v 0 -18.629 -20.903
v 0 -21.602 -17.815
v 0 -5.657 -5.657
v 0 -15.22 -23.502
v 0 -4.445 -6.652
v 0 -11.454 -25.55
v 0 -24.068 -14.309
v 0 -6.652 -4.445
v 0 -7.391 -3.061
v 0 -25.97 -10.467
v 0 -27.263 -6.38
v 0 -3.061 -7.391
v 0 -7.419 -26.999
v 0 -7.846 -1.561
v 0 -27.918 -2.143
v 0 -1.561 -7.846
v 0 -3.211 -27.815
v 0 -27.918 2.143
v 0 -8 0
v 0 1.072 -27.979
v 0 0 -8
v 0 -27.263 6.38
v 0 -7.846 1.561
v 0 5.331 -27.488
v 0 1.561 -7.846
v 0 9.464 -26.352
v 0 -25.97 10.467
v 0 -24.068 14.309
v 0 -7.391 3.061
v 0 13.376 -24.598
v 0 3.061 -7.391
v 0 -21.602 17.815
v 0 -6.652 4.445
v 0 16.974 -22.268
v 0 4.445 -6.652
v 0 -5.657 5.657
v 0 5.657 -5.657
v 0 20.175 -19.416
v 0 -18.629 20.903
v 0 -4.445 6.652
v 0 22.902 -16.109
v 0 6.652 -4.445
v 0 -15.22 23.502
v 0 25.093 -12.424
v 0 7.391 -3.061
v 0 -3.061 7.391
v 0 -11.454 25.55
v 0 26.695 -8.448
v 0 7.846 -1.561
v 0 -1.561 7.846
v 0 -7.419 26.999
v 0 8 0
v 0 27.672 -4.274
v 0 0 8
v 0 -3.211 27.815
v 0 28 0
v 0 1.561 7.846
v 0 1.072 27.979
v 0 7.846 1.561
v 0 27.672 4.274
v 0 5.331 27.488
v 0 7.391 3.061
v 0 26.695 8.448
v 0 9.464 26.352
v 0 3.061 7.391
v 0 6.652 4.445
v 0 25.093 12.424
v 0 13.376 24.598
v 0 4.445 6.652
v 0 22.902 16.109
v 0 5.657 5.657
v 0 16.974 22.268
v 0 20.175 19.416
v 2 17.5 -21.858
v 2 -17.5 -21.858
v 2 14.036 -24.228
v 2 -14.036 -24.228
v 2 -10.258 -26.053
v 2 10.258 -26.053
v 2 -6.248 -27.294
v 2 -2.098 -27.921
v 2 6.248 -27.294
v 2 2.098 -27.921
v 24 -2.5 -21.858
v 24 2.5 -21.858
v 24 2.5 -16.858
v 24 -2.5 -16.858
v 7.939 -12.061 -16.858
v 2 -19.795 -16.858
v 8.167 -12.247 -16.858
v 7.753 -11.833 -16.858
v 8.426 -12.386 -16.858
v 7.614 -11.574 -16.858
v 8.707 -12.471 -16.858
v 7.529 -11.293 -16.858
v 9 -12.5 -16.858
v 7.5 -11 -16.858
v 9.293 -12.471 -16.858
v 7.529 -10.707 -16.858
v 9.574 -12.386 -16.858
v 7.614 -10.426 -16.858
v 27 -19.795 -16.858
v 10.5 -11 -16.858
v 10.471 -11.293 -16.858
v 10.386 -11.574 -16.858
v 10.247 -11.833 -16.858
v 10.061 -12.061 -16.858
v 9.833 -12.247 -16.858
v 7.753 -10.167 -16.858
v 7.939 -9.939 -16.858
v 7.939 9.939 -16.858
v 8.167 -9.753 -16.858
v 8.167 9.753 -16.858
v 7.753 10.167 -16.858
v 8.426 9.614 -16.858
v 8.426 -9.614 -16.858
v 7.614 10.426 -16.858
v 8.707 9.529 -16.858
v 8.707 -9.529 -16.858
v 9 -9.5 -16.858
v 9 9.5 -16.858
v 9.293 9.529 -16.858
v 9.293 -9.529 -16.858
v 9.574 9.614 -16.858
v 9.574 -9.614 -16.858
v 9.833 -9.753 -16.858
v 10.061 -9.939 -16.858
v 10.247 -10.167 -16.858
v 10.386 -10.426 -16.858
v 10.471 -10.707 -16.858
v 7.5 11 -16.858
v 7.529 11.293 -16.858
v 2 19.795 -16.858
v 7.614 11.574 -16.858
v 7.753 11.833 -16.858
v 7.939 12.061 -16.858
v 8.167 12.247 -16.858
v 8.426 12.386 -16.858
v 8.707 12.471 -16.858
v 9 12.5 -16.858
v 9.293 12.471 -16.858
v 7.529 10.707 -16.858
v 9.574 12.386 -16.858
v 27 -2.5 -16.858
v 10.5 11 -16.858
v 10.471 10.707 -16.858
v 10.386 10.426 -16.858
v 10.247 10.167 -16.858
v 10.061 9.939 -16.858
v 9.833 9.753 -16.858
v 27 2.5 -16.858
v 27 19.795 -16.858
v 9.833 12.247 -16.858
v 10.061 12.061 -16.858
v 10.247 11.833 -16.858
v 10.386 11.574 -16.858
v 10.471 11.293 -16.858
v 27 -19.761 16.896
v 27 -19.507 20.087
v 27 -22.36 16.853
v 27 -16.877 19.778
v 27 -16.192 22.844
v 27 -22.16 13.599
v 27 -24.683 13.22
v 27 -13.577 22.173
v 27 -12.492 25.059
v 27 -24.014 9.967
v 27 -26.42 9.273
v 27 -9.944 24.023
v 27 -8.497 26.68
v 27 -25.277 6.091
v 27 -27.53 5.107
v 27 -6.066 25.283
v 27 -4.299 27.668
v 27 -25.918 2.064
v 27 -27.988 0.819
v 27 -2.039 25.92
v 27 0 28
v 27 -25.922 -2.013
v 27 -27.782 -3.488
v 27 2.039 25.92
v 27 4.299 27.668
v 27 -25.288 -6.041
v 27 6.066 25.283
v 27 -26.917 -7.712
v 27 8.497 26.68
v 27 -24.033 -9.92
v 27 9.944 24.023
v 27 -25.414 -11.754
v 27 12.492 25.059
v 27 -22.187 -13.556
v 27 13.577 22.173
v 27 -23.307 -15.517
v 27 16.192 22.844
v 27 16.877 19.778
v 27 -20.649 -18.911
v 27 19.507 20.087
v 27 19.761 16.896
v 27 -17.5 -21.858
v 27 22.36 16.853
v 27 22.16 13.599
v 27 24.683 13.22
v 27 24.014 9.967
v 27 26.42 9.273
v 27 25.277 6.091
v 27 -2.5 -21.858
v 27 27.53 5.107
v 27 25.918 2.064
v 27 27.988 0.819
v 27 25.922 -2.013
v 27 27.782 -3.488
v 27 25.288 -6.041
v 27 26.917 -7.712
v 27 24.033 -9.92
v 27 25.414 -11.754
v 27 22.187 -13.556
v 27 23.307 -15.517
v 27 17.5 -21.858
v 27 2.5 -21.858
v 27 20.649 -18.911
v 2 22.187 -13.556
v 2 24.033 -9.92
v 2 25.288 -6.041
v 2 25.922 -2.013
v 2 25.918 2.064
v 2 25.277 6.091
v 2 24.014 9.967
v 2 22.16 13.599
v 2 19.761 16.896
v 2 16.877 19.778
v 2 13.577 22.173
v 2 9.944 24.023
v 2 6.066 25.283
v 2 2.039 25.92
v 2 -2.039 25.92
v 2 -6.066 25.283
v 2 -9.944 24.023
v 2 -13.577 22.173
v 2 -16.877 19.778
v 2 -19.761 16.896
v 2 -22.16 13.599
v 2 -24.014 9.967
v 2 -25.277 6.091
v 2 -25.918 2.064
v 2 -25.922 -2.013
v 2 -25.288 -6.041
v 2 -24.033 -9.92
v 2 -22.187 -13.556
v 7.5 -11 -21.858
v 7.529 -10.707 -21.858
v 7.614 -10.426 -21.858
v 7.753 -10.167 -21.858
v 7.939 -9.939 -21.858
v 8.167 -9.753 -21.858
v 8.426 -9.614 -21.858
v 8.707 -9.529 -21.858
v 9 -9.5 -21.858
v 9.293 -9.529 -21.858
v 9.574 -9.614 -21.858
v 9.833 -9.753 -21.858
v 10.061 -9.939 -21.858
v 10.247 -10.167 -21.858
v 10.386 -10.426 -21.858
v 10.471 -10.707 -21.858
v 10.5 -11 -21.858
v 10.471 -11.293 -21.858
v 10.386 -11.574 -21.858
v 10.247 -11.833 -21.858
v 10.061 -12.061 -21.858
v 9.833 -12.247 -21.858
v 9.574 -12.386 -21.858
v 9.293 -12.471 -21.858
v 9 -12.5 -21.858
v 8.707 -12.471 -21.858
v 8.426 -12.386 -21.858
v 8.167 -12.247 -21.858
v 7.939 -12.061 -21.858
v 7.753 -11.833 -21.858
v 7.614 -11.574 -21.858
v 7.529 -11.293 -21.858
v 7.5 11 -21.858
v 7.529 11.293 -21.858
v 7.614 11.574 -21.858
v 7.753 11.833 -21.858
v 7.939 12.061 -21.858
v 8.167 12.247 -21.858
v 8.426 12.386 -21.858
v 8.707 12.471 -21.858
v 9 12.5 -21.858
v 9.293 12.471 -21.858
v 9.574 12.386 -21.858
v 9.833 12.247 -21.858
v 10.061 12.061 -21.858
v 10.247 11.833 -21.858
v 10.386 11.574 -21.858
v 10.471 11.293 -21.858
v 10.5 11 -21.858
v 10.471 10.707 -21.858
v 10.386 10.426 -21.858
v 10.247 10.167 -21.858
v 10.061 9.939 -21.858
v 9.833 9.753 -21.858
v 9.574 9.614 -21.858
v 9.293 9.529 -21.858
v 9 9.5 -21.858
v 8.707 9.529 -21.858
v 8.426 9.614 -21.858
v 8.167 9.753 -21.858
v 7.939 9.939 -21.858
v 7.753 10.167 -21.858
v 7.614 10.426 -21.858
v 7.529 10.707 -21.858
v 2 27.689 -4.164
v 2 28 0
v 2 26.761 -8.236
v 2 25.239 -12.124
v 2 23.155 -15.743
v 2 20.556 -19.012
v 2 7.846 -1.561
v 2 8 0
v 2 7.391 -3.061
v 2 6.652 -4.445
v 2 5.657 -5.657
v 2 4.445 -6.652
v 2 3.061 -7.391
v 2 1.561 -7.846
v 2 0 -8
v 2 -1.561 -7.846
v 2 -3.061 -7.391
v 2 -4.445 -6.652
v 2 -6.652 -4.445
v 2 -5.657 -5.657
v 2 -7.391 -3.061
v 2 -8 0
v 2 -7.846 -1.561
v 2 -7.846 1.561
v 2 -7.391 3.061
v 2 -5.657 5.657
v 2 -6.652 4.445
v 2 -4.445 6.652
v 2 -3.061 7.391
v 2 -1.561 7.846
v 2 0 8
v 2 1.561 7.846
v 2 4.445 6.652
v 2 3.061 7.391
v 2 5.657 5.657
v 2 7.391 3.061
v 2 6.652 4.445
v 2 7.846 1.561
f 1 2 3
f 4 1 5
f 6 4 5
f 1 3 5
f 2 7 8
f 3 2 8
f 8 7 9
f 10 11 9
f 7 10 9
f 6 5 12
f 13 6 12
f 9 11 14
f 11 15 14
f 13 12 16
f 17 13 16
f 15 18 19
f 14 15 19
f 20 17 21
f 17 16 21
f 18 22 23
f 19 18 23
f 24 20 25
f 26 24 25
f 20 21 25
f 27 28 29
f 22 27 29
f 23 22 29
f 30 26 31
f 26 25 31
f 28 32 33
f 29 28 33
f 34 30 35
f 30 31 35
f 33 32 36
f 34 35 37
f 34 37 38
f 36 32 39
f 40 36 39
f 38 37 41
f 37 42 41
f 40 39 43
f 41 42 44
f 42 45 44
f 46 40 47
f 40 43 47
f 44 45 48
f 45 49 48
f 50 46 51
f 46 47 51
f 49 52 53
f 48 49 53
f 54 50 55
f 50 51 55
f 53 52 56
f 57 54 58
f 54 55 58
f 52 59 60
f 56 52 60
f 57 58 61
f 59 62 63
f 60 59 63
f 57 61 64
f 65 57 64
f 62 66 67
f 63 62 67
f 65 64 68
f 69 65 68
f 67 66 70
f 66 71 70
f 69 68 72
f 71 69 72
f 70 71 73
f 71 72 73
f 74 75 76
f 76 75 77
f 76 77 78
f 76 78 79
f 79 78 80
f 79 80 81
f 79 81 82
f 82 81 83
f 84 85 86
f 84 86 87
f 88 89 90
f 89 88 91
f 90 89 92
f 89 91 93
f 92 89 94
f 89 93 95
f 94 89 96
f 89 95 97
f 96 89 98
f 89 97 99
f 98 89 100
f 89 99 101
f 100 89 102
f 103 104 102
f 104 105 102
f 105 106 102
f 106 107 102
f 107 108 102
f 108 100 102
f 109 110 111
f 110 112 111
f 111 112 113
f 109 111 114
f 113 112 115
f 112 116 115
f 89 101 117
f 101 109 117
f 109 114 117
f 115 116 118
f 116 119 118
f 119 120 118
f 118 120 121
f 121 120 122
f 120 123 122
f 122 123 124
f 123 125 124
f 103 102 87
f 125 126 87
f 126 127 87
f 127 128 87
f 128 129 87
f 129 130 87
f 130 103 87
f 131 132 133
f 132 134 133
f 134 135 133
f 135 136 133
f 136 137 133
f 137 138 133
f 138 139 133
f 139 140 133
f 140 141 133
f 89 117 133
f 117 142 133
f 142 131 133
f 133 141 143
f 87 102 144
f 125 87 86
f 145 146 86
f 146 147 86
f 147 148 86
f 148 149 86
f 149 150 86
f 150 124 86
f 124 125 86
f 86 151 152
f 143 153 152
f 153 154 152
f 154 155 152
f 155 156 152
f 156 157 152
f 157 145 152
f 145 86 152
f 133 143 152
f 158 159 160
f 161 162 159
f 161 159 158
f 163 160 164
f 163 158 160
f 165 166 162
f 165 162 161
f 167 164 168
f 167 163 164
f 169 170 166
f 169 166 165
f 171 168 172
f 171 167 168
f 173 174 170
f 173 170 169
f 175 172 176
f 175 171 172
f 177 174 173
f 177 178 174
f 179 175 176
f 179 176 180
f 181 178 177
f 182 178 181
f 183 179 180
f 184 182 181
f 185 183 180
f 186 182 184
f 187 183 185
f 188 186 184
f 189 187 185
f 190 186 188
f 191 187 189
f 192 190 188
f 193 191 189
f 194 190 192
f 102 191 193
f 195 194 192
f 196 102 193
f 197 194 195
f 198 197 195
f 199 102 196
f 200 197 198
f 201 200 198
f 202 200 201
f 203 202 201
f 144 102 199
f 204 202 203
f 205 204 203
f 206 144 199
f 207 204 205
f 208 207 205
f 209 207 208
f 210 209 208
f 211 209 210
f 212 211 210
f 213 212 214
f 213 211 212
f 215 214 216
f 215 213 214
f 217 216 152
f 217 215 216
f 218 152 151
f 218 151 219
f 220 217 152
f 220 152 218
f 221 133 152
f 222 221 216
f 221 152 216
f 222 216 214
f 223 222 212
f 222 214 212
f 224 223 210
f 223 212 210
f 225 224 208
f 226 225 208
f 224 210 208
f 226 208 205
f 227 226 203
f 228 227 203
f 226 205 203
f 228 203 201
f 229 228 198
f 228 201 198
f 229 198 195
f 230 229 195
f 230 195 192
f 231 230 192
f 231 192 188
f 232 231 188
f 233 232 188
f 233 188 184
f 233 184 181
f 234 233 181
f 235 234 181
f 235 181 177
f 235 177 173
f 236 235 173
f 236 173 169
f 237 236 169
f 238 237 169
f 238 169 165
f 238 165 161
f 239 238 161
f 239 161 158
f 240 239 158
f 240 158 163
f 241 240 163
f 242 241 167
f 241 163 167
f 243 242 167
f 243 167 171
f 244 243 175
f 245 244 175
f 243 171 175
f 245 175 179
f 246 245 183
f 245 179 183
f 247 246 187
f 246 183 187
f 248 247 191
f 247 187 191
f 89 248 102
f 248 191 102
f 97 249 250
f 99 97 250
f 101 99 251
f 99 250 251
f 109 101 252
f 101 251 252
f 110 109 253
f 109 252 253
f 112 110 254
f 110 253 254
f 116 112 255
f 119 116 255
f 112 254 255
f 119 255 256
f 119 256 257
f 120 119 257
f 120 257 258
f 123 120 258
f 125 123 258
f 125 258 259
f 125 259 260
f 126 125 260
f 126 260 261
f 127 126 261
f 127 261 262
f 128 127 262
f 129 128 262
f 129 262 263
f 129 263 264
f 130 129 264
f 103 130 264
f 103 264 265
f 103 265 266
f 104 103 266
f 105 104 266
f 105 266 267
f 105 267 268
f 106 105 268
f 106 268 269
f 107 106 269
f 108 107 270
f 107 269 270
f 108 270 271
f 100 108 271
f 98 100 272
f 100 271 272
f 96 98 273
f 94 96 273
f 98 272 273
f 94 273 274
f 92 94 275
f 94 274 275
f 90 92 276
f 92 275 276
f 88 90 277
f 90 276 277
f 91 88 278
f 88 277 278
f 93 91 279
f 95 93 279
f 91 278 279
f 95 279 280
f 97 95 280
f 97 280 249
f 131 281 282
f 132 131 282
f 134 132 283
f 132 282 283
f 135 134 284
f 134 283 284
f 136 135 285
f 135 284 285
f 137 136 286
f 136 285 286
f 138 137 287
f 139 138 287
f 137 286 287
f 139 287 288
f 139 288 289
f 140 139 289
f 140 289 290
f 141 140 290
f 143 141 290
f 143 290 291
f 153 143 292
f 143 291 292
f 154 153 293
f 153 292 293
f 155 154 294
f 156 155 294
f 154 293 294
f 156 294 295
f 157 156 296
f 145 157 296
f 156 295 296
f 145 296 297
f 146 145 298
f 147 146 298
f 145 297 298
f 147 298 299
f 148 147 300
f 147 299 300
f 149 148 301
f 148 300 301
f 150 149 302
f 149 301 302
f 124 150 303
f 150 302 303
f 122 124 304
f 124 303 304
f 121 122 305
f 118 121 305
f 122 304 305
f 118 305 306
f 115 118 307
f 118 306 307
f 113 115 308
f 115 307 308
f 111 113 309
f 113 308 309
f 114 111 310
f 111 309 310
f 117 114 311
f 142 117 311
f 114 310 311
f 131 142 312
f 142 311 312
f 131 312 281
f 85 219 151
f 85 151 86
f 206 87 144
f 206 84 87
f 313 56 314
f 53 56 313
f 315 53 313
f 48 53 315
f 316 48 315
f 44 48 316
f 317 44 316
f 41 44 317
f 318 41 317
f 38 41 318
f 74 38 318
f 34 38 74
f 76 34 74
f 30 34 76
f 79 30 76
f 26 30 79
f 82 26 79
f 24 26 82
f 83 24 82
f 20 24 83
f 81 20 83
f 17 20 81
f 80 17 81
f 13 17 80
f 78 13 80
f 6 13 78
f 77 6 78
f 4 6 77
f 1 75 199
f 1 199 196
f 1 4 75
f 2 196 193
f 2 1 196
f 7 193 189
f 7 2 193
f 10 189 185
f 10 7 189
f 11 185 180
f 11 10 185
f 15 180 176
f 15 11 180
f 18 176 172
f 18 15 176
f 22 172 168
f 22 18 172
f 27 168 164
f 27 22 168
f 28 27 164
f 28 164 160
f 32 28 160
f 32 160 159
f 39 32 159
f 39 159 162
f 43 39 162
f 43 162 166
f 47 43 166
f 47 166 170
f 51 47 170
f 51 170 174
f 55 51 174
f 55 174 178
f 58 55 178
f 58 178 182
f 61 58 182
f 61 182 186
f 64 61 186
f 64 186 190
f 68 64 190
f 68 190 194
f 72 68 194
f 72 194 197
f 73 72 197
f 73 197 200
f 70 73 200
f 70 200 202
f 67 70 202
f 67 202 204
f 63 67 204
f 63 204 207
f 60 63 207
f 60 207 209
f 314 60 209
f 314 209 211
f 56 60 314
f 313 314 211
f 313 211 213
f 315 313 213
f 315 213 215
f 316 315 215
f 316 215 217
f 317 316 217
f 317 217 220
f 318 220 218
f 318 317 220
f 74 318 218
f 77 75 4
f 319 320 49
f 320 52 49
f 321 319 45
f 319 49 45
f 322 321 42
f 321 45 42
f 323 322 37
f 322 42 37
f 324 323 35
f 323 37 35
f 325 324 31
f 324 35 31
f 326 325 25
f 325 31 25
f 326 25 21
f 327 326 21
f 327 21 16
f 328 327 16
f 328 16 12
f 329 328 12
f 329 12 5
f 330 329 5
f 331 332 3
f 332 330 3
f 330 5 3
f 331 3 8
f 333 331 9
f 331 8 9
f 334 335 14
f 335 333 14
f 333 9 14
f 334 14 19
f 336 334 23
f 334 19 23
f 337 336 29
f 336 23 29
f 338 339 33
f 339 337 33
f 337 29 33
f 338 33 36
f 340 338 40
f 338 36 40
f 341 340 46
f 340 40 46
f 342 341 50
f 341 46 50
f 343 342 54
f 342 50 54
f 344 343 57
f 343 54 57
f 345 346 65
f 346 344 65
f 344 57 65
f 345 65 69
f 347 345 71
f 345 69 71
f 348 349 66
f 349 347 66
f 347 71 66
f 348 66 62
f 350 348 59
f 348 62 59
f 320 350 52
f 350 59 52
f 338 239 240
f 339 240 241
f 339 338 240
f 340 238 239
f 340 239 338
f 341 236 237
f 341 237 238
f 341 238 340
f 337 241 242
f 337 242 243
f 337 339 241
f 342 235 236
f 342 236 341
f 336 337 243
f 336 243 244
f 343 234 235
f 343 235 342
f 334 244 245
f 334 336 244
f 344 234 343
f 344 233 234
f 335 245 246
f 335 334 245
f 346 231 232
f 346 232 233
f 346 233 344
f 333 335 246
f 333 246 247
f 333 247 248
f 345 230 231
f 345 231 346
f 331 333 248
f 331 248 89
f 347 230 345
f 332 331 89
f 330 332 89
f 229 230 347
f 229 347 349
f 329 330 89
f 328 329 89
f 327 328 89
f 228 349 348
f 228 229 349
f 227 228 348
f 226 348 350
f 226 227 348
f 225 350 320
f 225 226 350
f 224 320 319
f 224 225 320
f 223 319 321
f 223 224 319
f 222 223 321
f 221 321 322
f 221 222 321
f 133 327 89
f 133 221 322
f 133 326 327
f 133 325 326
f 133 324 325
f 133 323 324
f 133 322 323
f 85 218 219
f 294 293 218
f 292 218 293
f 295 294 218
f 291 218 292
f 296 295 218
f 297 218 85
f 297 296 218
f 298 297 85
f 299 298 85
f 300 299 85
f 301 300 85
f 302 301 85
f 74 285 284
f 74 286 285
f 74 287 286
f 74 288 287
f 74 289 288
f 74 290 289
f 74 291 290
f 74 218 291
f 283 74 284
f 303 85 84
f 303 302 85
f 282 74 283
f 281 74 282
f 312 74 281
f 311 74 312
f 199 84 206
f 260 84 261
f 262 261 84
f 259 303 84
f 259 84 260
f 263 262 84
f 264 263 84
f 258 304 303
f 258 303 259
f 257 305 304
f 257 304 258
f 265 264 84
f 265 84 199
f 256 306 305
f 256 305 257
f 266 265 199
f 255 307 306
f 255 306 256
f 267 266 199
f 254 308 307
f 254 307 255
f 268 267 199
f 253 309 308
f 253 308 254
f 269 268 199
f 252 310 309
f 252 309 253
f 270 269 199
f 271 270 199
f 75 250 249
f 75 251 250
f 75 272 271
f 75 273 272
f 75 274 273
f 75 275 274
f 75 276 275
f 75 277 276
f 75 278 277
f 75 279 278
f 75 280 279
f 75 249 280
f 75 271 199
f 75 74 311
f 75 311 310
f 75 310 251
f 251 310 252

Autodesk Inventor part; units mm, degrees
ref_plane "YZ Plane" through (0, 0, 0) normal (1, 0, 0) x (0, 1, 0)
ref_plane "XZ Plane" through (0, 0, 0) normal (0, 1, 0) x (-1, 0, 0)
ref_plane "XY Plane" through (0, 0, 0) normal (0, 0, 1) x (1, 0, 0)
sketch "スケッチ1" plane through (0, 0, 0) normal (1, 0, 0) x (0, 1, 0)
  circle A0 centre (0, 0) radius 28
  circle A1 centre (0, 0) radius 8
  dimension "d0" = 56
  dimension "d1" = 16
extrude "押し出し1" add sketch "スケッチ1" along normal blind 2
sketch "スケッチ2" plane through (2, 0, 0) normal (1, 0, 0) x (0, 0, -1)
  circle A0 centre (0, 0) radius 28 projected
  line L0 (21.8575, 17.5) -> (21.8575, -17.5)
  line L1 (19.8575, -19.7403) -> (19.8575, 19.7403)
  arc A1 (21.8575, 17.5) -> (19.8575, 19.7403) centre (0, 0) ccw
  arc A2 (17.6291, -21.7535) -> (21.8575, -17.5) centre (0, 0) ccw
  arc A3 (19.8575, 19.7403) -> (17.6291, -21.7535) centre (0, 0) ccw
  arc A4 (19.8575, 16.7833) -> (19.8575, -16.7833) centre (0, 0) ccw
  dimension "d4" = 2
  dimension "d30" = 35
  dimension "d31" = 2
extrude "押し出し2" add sketch "スケッチ2" along normal blind 25 contours L0 A0 L1 | L1 A4 A0 | L1 A4
sketch "スケッチ3" plane through (27, 0, 0) normal (1, 0, 0) x (0, 0, -1)
  circle A0 centre (0, 0) radius 28 projected
  line L0 (21.8575, -17.5) -> (21.8575, 17.5) projected
  line L1 (21.8575, 17.5) -> (21.8575, -17.5)
  arc A1 (21.8575, 17.5) -> (21.8575, -17.5) centre (0, 0) ccw
  arc A2 (21.8575, 14.0801) -> (21.8575, -14.0801) centre (0, 0) ccw
  line L2 (16.8575, -19.7946) -> (16.8575, 19.7946)
  dimension "d7" = 2
  dimension "d8" = 5
extrude "押し出し3" cut sketch "スケッチ3" against normal blind 25 contours L2 A2
sketch "スケッチ4" plane through (2, -17.5, -21.8575) normal (0, 0, -1) x (-1, 0, 0)
  line L0 (-25, 0) -> (-25, 35) projected
  line L1 (-25, 20) -> (-22, 20)
  line L2 (-22, 20) -> (-22, 15)
  line L3 (-22, 15) -> (-25, 15)
  line L4 (-25, 15) -> (-25, 20)
  line L5 (0, 35) -> (-25, 35) projected
  line L6 (0, 0) -> (-25, 0) projected
  point P0 (2, 17.5)
  dimension "d11" = 15
  dimension "d12" = 15
  dimension "d13" = 3
extrude "押し出し4" cut sketch "スケッチ4" against normal blind 25
sketch "スケッチ5" plane through (2, -17.5, -21.8575) normal (0, 0, -1) x (-1, 0, 0)
  circle A0 centre (-7, 6.5) radius 1.5
  circle A1 centre (-7, 28.5) radius 1.5
  line L0 (-13, 2.5) -> (-1, 2.5)
  line L1 (-1, 2.5) -> (-1, 32.5)
  line L2 (-1, 32.5) -> (-13, 32.5)
  line L3 (-13, 32.5) -> (-13, 2.5)
  line L4 (0, 35) -> (0, 0) projected
  line L5 (0, 35) -> (-25, 35) projected
  line L6 (0, 0) -> (-25, 0) projected
  point P0 (2, 17.5)
  dimension "d16" = 3
  dimension "d17" = 3
  dimension "d19" = 30
  dimension "d20" = 4
  dimension "d21" = 4
  dimension "d22" = 6
  dimension "d23" = 6
  dimension "d24" = 6
  dimension "d25" = 1
  dimension "d26" = 2.5
  dimension "d27" = 2.5
extrude "押し出し5" cut sketch "スケッチ5" against normal blind 25 contours A0 | A1
sketch "スケッチ6" plane through (2, -17.5, -21.8575) normal (0, 0, -1) x (-1, 0, 0)
  point P0 (2, 17.5)
properties part number "turn1part"
